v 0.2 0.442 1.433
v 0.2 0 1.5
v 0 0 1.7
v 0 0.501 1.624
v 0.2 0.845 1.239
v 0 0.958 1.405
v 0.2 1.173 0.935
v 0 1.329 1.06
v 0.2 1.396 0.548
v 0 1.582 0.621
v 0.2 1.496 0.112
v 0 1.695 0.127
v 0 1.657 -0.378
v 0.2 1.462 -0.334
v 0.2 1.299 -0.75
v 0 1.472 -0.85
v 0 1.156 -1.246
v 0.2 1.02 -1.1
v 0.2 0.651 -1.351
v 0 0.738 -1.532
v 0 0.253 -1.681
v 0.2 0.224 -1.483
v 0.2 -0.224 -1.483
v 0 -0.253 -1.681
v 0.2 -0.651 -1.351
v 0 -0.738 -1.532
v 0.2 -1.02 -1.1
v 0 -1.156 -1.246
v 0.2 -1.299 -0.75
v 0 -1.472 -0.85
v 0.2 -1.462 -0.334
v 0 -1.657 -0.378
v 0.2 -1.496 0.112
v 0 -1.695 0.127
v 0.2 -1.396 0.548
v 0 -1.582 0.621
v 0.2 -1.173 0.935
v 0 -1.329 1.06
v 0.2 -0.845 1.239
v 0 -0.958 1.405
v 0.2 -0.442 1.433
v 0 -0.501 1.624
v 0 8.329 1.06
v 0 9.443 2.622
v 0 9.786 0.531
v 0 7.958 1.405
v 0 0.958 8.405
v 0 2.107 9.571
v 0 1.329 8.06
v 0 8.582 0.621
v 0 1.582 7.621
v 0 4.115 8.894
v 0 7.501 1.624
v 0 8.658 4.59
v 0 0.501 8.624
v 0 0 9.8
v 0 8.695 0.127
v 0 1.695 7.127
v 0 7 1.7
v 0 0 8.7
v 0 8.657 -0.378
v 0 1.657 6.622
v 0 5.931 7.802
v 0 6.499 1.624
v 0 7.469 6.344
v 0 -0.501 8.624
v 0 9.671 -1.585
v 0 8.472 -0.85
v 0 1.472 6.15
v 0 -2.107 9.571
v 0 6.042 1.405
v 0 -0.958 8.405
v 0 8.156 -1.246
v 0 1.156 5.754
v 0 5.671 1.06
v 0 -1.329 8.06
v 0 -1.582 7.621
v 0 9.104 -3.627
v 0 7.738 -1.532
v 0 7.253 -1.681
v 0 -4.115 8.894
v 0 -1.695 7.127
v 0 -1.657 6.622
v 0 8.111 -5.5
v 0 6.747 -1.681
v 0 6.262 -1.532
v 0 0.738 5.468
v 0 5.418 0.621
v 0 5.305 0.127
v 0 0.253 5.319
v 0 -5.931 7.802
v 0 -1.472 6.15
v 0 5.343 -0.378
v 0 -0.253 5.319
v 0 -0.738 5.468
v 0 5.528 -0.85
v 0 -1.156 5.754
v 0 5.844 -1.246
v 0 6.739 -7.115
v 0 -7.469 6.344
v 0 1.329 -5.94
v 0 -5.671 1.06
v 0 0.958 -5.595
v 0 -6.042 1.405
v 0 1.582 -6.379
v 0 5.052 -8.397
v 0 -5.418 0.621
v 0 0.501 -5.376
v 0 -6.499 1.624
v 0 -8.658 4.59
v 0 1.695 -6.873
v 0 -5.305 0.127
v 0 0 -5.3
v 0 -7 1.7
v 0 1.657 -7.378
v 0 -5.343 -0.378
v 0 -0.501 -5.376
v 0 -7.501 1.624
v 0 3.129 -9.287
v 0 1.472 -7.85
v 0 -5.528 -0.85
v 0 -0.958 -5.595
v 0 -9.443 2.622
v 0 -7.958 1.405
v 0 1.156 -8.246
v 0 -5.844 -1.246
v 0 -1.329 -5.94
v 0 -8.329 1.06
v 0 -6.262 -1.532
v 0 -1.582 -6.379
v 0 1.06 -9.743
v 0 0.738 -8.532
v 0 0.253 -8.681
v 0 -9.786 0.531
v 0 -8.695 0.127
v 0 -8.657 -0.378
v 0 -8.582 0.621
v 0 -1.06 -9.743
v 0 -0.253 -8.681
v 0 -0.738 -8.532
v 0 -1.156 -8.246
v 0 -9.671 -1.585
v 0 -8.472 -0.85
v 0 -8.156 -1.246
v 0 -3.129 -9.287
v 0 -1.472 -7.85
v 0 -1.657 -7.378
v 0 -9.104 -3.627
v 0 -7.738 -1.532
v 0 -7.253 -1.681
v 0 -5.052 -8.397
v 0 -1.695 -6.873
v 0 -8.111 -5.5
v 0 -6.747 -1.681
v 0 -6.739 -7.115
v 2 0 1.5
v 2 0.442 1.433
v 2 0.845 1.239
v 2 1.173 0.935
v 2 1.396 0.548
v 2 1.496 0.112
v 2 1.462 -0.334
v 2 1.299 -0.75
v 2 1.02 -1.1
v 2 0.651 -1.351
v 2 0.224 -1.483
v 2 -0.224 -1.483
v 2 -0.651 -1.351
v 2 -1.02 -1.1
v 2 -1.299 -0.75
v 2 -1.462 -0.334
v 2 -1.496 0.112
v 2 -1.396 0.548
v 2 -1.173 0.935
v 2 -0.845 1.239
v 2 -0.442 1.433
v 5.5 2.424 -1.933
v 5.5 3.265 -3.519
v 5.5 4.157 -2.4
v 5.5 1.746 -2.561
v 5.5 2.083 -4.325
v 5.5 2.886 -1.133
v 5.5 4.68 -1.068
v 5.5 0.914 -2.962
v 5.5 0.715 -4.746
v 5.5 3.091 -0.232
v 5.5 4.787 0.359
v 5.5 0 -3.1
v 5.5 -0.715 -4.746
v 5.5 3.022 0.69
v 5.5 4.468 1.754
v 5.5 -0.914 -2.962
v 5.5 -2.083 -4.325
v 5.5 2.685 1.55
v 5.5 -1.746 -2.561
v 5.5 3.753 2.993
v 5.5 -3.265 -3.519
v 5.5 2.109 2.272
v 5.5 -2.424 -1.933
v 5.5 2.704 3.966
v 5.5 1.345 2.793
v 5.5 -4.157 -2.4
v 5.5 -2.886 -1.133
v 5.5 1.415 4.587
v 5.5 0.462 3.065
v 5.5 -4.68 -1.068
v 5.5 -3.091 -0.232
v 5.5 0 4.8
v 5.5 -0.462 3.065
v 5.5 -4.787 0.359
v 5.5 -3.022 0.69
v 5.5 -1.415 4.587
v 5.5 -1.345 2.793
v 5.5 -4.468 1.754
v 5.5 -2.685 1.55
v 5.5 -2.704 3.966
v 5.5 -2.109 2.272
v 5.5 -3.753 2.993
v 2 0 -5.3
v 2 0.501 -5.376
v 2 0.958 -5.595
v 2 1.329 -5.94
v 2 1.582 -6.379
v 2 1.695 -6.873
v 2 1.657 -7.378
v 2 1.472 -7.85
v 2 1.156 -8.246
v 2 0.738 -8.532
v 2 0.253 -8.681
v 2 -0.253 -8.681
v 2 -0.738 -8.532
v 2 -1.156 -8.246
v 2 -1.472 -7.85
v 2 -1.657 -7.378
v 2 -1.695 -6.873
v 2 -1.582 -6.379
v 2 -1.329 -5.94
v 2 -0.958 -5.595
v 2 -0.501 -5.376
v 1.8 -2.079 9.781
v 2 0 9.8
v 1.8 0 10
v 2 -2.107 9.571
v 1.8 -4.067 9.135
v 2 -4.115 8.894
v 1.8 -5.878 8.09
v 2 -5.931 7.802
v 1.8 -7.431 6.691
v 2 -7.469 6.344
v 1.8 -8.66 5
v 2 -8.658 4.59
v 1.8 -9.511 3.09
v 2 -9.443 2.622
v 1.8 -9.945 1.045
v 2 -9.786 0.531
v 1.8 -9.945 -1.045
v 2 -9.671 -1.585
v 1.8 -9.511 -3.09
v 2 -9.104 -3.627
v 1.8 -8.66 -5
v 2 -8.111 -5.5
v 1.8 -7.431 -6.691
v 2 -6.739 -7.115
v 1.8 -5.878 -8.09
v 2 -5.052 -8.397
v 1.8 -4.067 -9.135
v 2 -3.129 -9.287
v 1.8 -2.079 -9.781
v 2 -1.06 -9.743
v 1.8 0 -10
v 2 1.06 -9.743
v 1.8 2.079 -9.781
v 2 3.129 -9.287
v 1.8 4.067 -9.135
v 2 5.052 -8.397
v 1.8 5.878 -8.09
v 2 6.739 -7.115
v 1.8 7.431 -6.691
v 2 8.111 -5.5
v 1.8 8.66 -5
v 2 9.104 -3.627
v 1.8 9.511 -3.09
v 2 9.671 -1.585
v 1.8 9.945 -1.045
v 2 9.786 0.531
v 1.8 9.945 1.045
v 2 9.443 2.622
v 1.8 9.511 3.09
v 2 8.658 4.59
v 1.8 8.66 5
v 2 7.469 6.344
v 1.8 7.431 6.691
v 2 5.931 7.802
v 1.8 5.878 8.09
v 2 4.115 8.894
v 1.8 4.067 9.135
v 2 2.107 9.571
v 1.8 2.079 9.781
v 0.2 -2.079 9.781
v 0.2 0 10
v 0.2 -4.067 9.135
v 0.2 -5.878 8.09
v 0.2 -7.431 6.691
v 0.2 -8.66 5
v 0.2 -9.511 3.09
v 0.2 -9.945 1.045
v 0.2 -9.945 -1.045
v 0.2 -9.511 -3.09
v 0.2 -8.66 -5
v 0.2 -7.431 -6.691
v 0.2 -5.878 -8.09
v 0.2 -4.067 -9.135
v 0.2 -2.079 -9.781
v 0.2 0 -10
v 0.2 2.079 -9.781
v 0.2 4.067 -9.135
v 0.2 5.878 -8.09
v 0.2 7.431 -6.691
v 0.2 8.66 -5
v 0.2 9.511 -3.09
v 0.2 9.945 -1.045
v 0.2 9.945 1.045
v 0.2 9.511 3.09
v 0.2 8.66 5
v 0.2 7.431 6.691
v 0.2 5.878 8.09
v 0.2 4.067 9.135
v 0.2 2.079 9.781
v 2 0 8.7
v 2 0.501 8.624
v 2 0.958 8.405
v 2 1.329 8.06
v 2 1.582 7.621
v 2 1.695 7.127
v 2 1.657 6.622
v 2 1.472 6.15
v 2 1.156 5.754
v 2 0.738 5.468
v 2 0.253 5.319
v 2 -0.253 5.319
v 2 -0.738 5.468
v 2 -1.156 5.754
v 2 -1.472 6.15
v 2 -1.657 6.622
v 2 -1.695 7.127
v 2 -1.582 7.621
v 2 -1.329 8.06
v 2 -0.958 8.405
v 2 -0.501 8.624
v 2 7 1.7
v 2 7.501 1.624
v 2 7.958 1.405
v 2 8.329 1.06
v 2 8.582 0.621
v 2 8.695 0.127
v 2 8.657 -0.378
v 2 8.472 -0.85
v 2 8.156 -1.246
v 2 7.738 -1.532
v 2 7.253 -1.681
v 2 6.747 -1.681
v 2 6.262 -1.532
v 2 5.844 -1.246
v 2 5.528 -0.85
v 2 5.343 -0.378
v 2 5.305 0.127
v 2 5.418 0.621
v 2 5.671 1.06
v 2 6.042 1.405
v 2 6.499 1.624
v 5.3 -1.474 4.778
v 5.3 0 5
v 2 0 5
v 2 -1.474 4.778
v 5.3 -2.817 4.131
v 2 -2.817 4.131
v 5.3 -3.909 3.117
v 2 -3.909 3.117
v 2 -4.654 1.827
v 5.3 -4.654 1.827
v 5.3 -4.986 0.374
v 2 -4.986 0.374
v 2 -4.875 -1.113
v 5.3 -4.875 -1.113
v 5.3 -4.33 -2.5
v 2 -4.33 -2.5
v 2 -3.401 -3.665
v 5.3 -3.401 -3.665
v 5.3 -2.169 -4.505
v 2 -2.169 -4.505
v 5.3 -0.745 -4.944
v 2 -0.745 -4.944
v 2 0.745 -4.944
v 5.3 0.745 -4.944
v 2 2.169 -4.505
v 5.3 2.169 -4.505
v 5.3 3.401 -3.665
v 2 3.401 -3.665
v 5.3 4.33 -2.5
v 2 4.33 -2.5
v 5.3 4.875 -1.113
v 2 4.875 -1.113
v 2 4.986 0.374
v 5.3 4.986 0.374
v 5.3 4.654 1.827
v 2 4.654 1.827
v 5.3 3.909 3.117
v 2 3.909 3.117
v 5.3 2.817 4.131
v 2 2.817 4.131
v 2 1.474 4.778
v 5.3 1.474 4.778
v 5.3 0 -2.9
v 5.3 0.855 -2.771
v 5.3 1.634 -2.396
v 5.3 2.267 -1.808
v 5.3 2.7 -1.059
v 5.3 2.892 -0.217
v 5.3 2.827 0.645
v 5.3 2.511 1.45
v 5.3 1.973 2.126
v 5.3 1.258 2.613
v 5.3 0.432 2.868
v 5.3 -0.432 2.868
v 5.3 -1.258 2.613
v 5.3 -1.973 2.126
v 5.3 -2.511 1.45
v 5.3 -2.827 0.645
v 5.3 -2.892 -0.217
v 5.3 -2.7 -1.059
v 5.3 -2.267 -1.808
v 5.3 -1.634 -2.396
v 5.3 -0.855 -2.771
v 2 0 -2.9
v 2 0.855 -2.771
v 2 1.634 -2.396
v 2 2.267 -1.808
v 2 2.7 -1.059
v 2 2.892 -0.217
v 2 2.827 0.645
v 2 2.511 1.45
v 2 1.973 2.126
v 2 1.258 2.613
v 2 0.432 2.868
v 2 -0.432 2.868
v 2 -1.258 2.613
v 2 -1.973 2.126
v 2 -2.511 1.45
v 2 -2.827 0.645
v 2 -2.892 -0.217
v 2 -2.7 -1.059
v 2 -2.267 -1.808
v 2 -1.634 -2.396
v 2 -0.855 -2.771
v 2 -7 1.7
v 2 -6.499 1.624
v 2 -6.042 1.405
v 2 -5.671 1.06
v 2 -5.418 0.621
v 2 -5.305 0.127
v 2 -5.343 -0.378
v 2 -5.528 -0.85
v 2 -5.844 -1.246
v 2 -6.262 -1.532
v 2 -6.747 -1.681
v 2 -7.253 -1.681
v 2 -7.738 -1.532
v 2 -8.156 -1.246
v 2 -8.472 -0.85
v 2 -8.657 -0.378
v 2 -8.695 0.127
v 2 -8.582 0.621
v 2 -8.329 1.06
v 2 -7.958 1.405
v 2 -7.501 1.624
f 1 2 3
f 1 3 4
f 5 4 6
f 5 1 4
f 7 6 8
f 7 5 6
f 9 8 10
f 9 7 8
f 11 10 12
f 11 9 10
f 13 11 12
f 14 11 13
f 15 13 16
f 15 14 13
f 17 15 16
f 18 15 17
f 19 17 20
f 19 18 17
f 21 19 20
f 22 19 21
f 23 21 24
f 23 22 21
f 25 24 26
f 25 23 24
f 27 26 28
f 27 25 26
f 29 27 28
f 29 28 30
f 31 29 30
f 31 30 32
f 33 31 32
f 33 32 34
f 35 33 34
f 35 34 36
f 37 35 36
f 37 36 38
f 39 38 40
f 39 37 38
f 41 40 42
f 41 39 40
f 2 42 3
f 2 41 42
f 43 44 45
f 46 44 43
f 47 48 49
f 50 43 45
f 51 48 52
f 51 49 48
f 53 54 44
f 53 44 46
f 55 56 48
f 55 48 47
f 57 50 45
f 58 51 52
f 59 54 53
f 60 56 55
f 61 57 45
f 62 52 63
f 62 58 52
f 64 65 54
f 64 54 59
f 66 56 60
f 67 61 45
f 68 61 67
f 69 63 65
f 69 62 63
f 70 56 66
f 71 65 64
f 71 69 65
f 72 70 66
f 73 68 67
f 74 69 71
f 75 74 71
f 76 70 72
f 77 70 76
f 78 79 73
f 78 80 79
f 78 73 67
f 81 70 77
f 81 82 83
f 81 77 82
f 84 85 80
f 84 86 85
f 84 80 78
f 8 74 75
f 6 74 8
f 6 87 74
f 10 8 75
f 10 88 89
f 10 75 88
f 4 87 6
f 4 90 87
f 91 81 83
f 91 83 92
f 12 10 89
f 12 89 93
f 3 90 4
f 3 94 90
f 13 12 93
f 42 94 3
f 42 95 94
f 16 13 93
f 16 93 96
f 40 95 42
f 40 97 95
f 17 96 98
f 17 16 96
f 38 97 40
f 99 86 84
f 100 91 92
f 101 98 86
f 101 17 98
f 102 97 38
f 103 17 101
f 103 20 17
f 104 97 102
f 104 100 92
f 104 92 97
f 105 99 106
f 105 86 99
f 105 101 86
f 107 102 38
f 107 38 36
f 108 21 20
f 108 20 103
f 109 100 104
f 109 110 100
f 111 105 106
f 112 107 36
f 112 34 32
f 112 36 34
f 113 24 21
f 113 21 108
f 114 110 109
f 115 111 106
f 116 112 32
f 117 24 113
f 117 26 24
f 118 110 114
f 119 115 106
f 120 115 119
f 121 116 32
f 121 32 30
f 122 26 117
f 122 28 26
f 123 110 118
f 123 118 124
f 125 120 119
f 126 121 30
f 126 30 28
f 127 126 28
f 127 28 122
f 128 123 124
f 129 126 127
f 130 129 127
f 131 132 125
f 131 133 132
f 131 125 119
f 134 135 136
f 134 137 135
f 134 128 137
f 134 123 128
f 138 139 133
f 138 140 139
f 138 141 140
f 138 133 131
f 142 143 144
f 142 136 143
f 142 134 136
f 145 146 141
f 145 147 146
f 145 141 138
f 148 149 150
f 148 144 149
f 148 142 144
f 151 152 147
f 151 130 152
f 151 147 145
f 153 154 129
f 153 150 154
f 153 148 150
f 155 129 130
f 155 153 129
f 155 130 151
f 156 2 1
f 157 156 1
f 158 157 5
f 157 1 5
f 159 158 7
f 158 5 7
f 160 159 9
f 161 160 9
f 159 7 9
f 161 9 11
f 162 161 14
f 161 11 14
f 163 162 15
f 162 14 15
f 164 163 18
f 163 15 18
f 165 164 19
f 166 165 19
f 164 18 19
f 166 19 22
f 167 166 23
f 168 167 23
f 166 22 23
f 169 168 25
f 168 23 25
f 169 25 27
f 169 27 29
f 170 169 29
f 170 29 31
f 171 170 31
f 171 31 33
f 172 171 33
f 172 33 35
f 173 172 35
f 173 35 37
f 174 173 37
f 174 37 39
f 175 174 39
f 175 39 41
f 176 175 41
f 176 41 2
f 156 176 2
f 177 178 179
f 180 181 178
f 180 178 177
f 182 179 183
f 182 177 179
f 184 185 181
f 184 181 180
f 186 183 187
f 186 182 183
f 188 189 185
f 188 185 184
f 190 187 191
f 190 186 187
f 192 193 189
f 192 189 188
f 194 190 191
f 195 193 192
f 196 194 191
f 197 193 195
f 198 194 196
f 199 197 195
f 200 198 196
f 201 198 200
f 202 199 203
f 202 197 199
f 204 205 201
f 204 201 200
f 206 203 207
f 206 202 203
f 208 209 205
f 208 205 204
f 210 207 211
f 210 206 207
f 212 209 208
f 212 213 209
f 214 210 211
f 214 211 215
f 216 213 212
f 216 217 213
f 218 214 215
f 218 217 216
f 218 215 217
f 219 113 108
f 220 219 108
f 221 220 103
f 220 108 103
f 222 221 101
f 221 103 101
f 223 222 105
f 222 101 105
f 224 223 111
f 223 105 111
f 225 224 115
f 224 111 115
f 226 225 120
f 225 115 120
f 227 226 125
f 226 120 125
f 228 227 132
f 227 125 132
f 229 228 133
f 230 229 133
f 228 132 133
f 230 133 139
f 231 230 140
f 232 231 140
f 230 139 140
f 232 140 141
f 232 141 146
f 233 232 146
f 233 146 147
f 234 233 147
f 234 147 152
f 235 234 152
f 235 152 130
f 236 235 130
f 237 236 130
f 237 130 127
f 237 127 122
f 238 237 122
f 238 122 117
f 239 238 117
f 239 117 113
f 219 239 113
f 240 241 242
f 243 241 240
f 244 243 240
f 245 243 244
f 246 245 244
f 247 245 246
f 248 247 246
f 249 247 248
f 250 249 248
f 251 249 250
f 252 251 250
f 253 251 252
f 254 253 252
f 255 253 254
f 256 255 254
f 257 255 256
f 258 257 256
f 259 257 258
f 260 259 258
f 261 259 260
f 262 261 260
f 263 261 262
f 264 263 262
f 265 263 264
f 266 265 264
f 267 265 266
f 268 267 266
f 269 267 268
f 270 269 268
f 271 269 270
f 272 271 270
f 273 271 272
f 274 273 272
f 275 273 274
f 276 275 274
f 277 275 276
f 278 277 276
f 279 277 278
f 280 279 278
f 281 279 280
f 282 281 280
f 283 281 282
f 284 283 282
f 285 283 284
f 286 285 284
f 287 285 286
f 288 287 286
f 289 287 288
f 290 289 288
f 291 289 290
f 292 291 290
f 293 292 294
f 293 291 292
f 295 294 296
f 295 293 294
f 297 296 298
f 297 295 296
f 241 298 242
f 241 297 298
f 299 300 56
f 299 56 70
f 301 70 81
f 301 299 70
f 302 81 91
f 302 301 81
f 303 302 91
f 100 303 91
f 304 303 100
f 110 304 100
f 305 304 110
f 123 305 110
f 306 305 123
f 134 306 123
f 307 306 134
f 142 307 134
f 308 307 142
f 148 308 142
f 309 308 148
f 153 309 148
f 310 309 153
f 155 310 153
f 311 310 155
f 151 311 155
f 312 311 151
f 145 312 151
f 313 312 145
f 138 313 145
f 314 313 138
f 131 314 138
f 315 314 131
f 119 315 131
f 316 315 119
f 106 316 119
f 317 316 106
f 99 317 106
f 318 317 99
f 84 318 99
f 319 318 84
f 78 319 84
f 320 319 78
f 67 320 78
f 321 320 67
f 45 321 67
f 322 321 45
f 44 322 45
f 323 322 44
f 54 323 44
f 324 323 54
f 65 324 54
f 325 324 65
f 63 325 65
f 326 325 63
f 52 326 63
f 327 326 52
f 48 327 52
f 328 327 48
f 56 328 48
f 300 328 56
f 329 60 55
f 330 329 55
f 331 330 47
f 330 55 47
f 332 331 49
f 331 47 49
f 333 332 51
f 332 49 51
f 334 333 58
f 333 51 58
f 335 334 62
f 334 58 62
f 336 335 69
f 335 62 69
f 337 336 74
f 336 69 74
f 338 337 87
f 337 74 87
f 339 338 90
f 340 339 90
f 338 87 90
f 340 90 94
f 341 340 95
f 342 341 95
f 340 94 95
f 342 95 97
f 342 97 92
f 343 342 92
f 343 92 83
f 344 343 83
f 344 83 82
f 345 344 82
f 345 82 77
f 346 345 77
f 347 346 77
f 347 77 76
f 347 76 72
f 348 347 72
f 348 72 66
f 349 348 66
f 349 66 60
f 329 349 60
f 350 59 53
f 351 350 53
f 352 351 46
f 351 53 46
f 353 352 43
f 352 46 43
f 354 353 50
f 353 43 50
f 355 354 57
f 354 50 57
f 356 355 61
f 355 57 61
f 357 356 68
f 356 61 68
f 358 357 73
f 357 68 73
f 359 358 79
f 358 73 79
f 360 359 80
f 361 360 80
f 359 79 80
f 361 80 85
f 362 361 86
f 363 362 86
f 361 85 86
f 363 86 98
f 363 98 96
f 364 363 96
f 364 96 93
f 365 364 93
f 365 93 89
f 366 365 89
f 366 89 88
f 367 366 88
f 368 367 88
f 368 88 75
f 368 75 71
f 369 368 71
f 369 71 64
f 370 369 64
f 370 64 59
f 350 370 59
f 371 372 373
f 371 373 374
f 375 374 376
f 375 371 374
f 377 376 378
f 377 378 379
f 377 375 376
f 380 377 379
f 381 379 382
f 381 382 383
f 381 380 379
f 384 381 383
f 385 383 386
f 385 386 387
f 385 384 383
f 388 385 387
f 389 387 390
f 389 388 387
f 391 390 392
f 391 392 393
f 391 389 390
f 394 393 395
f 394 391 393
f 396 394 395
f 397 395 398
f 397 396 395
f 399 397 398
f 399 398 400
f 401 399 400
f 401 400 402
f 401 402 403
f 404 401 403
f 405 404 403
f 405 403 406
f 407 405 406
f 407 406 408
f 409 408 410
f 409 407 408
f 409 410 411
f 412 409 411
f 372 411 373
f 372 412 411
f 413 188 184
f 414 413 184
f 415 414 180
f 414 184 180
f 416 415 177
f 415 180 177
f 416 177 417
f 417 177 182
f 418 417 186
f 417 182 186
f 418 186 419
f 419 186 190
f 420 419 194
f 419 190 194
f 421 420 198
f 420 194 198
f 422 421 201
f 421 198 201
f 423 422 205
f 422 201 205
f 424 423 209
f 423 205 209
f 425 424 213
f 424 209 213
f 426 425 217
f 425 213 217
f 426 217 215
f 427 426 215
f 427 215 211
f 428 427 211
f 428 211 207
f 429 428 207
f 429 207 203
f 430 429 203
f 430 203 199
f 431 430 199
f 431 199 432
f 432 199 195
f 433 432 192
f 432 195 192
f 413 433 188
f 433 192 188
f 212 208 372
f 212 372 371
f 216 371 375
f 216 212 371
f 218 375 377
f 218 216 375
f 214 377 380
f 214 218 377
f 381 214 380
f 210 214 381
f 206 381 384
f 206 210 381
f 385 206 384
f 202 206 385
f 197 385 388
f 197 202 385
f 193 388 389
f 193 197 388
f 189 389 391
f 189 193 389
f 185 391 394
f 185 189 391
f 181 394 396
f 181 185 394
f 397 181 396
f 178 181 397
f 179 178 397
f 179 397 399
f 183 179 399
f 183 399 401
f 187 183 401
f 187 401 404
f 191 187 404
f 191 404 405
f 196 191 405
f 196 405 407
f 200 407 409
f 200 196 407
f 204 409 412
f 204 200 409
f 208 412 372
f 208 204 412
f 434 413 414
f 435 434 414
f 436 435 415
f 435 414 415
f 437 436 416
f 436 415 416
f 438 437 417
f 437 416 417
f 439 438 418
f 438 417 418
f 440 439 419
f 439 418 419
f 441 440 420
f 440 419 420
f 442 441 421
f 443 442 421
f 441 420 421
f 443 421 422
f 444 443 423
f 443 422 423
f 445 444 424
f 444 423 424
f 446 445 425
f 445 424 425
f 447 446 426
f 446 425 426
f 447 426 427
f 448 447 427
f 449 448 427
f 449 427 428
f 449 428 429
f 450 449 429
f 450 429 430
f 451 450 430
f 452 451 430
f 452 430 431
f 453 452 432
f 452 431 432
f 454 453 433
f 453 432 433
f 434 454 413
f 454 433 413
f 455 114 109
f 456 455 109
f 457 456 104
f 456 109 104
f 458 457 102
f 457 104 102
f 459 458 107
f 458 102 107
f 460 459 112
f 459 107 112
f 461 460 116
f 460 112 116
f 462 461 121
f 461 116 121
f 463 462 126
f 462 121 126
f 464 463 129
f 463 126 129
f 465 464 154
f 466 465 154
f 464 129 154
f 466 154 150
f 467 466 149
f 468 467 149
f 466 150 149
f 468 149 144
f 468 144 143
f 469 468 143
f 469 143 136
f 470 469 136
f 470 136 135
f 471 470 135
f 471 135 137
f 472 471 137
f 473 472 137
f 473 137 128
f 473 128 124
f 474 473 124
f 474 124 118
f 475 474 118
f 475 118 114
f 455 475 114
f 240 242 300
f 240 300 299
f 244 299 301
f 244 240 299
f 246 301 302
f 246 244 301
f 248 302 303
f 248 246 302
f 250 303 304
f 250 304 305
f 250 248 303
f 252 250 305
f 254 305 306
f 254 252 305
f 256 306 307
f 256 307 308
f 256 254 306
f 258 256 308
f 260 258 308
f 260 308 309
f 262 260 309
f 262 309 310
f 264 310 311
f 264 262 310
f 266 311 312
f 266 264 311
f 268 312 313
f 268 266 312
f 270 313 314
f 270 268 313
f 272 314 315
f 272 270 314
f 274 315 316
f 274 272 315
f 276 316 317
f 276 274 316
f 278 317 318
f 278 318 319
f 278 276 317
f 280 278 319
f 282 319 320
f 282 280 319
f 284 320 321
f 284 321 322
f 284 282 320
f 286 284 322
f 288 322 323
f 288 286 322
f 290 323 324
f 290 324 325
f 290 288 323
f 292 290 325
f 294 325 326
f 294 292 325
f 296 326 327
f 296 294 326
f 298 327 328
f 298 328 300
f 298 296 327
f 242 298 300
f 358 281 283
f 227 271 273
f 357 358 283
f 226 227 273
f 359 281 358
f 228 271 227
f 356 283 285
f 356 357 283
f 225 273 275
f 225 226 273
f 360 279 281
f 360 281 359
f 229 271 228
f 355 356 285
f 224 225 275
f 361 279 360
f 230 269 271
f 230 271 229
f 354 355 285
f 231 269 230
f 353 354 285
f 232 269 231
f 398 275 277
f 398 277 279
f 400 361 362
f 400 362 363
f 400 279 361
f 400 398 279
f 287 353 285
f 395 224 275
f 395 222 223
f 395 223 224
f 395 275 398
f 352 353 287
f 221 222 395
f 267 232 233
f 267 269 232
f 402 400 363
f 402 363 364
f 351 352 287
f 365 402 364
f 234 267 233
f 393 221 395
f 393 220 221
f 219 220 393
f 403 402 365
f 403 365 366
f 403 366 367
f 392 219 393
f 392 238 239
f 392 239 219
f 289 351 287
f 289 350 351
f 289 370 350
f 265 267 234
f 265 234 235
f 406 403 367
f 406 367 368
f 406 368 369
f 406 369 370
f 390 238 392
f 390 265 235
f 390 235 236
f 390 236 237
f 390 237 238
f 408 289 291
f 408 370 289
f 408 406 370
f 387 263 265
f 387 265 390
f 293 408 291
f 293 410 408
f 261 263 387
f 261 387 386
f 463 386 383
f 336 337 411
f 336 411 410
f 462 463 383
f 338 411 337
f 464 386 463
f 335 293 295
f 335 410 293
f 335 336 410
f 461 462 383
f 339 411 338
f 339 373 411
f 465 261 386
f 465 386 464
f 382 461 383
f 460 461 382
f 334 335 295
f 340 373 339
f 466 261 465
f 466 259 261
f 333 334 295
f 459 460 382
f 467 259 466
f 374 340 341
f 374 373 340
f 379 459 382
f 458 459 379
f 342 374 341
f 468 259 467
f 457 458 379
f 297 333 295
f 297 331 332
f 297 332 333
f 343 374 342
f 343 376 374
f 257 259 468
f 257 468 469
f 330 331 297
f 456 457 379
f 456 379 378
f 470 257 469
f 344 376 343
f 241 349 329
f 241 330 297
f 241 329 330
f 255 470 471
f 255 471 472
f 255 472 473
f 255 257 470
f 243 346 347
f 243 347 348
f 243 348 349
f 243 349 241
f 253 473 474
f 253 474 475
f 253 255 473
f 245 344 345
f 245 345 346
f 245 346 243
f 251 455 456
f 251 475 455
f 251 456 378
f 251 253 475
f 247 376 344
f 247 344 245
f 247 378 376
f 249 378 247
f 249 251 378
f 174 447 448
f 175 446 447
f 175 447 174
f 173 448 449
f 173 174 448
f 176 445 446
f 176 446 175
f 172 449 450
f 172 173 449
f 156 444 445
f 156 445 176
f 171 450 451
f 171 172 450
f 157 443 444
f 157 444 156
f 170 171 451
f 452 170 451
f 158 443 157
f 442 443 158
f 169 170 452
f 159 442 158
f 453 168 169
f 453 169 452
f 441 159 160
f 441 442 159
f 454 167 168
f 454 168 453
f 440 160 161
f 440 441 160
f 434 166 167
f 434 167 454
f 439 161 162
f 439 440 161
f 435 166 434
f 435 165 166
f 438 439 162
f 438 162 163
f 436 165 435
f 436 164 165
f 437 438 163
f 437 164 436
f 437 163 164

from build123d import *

# Parameters (mm, degrees)
SKETCH_2_R                  = 2.9
CUT_EXTRUDE_1_DEPTH         = 3.5
CUT_EXTRUDE_2_REACH         = 17.174
SKETCH_3_R                  = 1.5
HOLE_WIZARD_3_4_3_4_1_D     = 3.4
HOLE_WIZARD_3_4_3_4_1_DEPTH = 10
HOLE_WIZARD_3_4_3_4_1_TIP   = 1.021463052
CHAMFER_1_SIZE              = 0.2


with BuildPart() as part:
    # 草图1 → 旋转1 (revolve)
    with BuildSketch(Plane.XY, mode=Mode.PRIVATE) as revolve_1_sk:
        Polygon((0, 0), (0, 10), (2, 10), (2, 5), (5.5, 5), (5.5, 0), align=None)
    revolve(revolve_1_sk.sketch.rotate(Axis((0, 0, 0), (1, 0, 0)), 90), axis=Axis((0, 0, 0), (1, 0, 0)))

    # 草图2 → 切除-拉伸1 (cut)
    with BuildSketch(Plane(origin=(5.5, 0, 0), x_dir=(0, 0, -1), z_dir=(1, 0, 0))):
        Circle(SKETCH_2_R)
    extrude(amount=-CUT_EXTRUDE_1_DEPTH, mode=Mode.SUBTRACT)

    # 草图3 → 切除-拉伸2 (cut, up to next)
    with BuildSketch(Plane.ZY, mode=Mode.PRIVATE) as cut_extrude_2_sk1:
        Circle(SKETCH_3_R)
    cut_extrude_2_tool1 = extrude(cut_extrude_2_sk1.sketch, amount=-CUT_EXTRUDE_2_REACH, mode=Mode.PRIVATE) & part.part
    add(cut_extrude_2_tool1.solids().sort_by_distance((0, 0, 0))[0], mode=Mode.SUBTRACT)

    # Ø3.4 (3.4) 直径孔1
    with Locations(Plane(origin=(2, 0, 0), x_dir=(0, 0, -1), z_dir=(1, 0, 0))):
        with Locations((0, 7), (0, -7), (-7, 0), (7, 0)):
            Hole(HOLE_WIZARD_3_4_3_4_1_D / 2, depth=HOLE_WIZARD_3_4_3_4_1_DEPTH)
            with Locations((0, 0, -(HOLE_WIZARD_3_4_3_4_1_DEPTH + HOLE_WIZARD_3_4_3_4_1_TIP / 2))):  # 118° drill point
                Cone(0, HOLE_WIZARD_3_4_3_4_1_D / 2, HOLE_WIZARD_3_4_3_4_1_TIP, mode=Mode.SUBTRACT)

    # 倒角1
    chamfer_1_edges = [part.edges().sort_by_distance(p)[0] for p in [
        (5.5, 0, 2.9),
        (0, 0, -1.5),
        (5.5, 0, -5),
        (2, 0, -10),
        (0, 0, -10),
    ]]
    chamfer(chamfer_1_edges, length=CHAMFER_1_SIZE)


solid = part.part
